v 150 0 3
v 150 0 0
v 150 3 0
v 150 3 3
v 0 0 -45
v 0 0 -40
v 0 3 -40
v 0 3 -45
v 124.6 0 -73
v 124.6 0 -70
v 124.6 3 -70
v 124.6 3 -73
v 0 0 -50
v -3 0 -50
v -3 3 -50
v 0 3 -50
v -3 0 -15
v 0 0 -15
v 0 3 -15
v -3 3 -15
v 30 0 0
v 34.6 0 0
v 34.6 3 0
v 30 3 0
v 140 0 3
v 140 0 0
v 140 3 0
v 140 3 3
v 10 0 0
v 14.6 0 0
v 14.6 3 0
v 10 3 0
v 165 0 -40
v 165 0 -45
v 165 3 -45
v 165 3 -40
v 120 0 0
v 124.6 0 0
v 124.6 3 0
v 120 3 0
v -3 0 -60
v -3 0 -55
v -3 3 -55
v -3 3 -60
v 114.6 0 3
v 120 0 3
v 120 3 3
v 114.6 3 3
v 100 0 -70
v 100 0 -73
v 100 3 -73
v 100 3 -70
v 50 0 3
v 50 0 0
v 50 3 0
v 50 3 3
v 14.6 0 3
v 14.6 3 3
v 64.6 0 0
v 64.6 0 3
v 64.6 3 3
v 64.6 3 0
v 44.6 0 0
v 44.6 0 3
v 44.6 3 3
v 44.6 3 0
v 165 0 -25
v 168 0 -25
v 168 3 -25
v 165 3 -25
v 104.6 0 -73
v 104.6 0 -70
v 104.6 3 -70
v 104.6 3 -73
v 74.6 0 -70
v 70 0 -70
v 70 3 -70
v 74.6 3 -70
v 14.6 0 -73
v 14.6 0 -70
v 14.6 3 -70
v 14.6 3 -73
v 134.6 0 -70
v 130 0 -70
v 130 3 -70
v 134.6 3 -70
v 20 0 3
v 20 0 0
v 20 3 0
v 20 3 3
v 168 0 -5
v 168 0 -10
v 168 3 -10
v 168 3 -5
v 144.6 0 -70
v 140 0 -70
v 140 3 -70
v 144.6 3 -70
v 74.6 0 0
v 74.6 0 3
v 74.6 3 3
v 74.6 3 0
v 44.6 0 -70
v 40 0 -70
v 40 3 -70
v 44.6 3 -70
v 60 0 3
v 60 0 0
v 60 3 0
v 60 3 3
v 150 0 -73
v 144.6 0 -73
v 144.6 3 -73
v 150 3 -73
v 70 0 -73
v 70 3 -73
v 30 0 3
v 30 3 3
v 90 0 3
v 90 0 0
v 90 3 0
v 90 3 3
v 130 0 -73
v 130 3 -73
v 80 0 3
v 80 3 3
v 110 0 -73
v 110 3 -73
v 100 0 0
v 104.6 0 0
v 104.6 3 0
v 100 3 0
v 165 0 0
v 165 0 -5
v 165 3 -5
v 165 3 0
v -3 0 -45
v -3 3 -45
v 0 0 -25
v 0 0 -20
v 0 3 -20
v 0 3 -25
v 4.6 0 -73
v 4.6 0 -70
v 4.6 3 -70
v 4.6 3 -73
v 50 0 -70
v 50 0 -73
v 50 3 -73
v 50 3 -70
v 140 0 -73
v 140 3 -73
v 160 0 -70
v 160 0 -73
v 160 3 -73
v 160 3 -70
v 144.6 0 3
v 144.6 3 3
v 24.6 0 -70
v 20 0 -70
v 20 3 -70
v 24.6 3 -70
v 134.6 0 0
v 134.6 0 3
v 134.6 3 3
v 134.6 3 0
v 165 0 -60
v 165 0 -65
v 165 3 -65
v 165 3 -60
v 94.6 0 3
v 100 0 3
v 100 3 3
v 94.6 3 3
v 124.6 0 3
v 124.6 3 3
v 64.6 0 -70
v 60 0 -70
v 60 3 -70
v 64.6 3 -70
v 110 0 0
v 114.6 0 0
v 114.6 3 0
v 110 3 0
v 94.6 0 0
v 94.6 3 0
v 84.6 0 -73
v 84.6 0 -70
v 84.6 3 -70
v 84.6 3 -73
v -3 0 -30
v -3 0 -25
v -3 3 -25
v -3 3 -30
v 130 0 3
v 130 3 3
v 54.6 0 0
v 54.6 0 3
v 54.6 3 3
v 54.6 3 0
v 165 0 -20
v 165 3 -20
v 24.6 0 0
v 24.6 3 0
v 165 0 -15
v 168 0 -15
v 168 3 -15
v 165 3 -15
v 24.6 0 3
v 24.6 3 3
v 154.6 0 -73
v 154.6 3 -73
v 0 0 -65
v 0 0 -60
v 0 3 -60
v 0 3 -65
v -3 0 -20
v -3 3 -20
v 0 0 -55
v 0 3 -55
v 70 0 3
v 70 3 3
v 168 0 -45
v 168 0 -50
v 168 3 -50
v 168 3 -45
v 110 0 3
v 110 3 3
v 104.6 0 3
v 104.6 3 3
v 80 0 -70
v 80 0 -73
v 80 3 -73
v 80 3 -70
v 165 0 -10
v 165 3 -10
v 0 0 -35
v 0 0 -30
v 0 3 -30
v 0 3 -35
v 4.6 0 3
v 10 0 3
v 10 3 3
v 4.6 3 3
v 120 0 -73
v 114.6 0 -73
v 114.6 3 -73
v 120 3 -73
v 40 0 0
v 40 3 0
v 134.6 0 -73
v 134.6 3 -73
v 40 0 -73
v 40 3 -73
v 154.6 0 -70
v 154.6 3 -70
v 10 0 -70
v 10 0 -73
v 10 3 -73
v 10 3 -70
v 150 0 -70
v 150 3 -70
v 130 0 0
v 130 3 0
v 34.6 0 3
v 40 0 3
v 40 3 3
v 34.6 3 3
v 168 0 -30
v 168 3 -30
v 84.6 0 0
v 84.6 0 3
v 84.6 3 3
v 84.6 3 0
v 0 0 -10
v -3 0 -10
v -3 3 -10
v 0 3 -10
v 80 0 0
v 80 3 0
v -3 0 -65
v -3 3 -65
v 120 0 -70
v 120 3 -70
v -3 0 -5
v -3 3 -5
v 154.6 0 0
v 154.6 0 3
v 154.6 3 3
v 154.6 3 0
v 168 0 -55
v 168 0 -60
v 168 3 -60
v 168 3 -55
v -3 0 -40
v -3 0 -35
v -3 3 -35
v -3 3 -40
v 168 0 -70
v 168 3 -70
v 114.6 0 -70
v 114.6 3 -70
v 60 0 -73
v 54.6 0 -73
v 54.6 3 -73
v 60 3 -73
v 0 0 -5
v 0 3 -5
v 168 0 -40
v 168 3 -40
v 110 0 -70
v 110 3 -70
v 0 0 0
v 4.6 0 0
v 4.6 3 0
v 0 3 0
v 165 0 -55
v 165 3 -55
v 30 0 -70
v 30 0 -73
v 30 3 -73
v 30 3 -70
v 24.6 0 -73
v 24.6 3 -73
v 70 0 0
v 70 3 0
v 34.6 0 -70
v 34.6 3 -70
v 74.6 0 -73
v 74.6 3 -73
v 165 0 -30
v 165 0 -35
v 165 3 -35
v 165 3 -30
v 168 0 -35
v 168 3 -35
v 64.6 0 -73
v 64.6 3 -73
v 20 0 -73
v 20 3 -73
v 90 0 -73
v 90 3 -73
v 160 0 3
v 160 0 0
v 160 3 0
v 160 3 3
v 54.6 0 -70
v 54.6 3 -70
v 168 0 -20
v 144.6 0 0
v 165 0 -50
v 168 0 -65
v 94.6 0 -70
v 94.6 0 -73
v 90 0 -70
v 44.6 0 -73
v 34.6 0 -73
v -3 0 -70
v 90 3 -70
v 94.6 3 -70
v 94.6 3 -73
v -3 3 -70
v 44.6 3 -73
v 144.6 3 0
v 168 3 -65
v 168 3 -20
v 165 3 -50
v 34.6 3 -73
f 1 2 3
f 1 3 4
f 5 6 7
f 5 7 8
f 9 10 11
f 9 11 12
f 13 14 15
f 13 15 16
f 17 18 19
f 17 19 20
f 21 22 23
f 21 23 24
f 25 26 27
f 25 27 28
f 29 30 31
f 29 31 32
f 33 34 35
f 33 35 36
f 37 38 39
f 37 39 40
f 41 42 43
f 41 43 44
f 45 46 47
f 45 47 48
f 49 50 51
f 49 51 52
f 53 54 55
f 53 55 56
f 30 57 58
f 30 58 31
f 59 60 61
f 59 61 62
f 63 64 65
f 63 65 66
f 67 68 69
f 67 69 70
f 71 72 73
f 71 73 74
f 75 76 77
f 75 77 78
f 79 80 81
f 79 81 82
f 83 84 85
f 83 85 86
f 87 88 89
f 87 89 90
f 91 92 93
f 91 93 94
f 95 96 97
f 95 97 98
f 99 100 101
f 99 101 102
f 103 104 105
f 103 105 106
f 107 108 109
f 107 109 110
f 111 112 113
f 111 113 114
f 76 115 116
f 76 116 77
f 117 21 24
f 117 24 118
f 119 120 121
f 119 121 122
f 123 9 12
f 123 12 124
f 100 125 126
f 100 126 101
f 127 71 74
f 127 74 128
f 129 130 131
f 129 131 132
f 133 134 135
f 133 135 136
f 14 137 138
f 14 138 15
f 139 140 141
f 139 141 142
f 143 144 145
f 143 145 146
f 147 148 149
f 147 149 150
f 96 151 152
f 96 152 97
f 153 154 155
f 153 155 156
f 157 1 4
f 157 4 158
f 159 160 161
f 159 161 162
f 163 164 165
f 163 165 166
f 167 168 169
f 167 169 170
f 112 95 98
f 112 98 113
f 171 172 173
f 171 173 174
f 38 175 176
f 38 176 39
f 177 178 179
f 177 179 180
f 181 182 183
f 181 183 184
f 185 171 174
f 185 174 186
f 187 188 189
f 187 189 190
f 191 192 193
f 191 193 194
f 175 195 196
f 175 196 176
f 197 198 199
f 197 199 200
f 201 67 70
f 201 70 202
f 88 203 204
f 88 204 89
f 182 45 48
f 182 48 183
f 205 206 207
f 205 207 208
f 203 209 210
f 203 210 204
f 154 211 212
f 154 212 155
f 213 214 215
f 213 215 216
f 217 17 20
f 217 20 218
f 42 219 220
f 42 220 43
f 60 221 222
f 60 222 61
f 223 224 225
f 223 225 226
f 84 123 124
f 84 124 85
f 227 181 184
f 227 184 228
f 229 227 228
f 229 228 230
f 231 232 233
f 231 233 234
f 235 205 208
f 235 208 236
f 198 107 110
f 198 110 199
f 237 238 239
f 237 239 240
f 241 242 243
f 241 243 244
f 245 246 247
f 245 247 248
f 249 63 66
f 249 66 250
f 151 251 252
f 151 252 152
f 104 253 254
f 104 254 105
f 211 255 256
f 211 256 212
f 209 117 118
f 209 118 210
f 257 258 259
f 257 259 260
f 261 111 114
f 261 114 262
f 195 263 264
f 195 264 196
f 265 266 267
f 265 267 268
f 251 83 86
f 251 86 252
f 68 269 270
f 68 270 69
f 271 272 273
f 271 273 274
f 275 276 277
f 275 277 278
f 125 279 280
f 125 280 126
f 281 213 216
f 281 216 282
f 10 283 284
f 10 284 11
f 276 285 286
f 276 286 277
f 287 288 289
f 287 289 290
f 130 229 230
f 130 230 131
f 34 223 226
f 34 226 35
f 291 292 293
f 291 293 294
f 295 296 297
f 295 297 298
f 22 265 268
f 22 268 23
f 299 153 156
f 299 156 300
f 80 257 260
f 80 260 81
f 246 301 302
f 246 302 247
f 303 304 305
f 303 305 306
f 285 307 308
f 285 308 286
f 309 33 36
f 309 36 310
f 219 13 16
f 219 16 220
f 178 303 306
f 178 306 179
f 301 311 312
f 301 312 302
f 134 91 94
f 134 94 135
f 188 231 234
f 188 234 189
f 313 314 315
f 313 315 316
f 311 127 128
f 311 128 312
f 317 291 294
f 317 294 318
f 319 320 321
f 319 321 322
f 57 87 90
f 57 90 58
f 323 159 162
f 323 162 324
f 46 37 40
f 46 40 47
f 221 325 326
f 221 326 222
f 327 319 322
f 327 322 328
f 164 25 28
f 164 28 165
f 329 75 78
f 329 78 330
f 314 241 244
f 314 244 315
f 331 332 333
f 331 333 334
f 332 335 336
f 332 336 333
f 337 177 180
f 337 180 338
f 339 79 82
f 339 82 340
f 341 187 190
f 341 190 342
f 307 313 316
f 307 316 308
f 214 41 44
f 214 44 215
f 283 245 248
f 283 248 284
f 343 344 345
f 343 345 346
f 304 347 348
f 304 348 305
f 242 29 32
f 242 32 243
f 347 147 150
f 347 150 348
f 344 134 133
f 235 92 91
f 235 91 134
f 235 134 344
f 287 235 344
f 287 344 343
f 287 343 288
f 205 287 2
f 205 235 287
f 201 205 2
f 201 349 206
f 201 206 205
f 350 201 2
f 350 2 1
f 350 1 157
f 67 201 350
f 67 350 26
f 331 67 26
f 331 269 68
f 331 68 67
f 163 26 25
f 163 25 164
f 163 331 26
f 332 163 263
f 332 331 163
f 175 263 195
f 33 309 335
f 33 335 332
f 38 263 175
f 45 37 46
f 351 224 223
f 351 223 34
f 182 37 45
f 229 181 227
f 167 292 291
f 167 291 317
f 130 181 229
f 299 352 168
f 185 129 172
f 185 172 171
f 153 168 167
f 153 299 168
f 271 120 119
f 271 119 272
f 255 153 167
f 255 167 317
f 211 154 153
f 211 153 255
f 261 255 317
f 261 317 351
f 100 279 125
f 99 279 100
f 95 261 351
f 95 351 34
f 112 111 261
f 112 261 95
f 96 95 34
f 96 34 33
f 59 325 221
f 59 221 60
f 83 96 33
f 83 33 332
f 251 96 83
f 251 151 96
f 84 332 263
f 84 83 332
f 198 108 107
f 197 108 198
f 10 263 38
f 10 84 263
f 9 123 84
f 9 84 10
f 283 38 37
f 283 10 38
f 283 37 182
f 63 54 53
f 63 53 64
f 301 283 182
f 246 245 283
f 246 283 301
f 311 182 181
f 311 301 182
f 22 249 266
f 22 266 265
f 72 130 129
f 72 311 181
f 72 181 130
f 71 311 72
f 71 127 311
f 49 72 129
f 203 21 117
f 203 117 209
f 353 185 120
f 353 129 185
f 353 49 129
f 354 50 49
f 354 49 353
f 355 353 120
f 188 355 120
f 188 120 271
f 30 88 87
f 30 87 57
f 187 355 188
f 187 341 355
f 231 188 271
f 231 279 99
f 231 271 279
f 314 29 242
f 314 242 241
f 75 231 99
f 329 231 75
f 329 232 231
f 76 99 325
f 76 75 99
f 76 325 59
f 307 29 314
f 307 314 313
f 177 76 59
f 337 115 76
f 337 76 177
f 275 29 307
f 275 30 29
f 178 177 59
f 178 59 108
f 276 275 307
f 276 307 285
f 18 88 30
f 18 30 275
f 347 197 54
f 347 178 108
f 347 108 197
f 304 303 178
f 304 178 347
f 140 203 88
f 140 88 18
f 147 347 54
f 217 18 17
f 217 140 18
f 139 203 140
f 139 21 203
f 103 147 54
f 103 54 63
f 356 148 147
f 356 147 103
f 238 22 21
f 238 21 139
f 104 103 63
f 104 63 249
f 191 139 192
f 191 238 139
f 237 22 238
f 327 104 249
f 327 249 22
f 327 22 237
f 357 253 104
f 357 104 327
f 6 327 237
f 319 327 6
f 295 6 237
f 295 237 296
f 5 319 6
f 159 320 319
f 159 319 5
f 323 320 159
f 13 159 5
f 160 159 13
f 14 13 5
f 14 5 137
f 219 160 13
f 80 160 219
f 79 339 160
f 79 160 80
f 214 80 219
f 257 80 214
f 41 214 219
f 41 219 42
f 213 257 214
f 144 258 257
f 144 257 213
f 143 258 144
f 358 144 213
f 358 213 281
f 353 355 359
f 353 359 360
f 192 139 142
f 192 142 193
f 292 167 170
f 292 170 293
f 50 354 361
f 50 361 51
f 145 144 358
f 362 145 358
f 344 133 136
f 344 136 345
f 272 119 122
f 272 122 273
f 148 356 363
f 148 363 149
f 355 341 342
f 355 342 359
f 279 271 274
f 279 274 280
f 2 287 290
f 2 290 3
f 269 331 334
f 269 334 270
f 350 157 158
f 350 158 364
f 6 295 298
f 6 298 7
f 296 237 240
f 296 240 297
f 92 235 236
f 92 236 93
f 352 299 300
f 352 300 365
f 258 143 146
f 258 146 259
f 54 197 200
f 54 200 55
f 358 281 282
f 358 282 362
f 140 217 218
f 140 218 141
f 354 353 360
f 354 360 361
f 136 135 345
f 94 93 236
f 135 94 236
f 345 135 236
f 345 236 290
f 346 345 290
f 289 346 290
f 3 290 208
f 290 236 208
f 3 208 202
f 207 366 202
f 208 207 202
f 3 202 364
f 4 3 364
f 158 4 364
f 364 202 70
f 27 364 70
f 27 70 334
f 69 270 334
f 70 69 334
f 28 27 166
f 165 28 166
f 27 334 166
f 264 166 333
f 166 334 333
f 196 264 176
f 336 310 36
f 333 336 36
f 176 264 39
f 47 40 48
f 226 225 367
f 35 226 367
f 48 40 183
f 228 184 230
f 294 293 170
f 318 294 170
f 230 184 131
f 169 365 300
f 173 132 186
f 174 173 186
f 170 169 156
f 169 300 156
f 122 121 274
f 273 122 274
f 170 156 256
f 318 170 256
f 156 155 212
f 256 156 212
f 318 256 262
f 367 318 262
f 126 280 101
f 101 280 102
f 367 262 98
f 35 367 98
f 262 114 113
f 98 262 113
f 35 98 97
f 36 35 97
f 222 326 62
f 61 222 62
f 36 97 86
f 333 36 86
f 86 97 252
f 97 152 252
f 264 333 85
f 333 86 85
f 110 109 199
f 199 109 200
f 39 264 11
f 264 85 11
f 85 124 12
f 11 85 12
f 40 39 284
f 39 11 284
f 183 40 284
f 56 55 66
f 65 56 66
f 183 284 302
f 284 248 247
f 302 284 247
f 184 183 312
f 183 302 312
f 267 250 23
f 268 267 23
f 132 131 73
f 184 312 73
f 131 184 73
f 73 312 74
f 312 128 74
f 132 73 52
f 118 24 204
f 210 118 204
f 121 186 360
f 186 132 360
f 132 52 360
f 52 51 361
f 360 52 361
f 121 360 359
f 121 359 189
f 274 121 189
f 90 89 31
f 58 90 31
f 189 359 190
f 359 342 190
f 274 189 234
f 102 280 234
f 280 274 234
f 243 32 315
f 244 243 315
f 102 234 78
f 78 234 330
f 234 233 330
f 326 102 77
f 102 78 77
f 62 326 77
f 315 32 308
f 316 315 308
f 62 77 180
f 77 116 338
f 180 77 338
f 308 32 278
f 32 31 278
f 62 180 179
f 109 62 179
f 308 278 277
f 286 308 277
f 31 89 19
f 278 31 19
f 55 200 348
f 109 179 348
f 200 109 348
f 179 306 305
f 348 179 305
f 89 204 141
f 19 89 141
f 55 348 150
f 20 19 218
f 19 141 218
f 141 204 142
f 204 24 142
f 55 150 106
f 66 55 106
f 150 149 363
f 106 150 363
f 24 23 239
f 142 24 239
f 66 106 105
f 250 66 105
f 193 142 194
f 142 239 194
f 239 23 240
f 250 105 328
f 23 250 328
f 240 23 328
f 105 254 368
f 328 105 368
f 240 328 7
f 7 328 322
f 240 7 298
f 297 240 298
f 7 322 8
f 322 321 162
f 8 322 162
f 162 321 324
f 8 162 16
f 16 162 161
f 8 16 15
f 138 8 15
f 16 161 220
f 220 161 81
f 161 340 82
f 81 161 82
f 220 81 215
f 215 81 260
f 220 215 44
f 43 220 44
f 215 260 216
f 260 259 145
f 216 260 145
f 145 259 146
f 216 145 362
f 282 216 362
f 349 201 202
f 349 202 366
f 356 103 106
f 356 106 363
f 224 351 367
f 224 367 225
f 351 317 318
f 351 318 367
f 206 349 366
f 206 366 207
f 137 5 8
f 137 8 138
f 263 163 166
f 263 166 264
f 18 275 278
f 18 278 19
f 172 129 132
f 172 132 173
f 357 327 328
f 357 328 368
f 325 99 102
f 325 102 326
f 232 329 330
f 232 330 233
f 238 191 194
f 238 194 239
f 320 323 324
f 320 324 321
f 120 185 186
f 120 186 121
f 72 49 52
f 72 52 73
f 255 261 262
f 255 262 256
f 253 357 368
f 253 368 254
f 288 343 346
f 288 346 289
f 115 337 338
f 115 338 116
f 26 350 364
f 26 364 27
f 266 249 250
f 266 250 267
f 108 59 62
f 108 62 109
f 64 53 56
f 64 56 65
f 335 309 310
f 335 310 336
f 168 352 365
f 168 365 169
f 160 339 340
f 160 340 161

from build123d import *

# Parameters (mm, degrees)
EXTRUDE_1_DEPTH = 3


with BuildPart() as part:
    # Эскиз1 → Бобышка-Вытянуть1 (new body)
    with BuildSketch(Plane(origin=(0, 0, 0), x_dir=(1, 0, 0), z_dir=(0, 1, 0))):
        Polygon((4.6, 70), (4.6, 73), (10, 73), (10, 70), (14.6, 70), (14.6, 73), (20, 73), (20, 70), (24.6, 70), (24.6, 73), (30, 73), (30, 70), (34.6, 70), (34.6, 73), (40, 73), (40, 70), (44.6, 70), (44.6, 73), (50, 73), (50, 70), (54.6, 70), (54.6, 73), (60, 73), (60, 70), (64.6, 70), (64.6, 73), (70, 73), (70, 70), (74.6, 70), (74.6, 73), (80, 73), (80, 70), (84.6, 70), (84.6, 73), (90, 73), (90, 70), (94.6, 70), (94.6, 73), (100, 73), (100, 70), (104.6, 70), (104.6, 73), (110, 73), (110, 70), (114.6, 70), (114.6, 73), (120, 73), (120, 70), (124.6, 70), (124.6, 73), (130, 73), (130, 70), (134.6, 70), (134.6, 73), (140, 73), (140, 70), (144.6, 70), (144.6, 73), (150, 73), (150, 70), (154.6, 70), (154.6, 73), (160, 73), (160, 70), (168, 70), (168, 65), (165, 65), (165, 60), (168, 60), (168, 55), (165, 55), (165, 50), (168, 50), (168, 45), (165, 45), (165, 40), (168, 40), (168, 35), (165, 35), (165, 30), (168, 30), (168, 25), (165, 25), (165, 20), (168, 20), (168, 15), (165, 15), (165, 10), (168, 10), (168, 5), (165, 5), (165, 0), (160, 0), (160, -3), (154.6, -3), (154.6, 0), (150, 0), (150, -3), (144.6, -3), (144.6, 0), (140, 0), (140, -3), (134.6, -3), (134.6, 0), (130, 0), (130, -3), (124.6, -3), (124.6, 0), (120, 0), (120, -3), (114.6, -3), (114.6, 0), (110, 0), (110, -3), (104.6, -3), (104.6, 0), (100, 0), (100, -3), (94.6, -3), (94.6, 0), (90, 0), (90, -3), (84.6, -3), (84.6, 0), (80, 0), (80, -3), (74.6, -3), (74.6, 0), (70, 0), (70, -3), (64.6, -3), (64.6, 0), (60, 0), (60, -3), (54.6, -3), (54.6, 0), (50, 0), (50, -3), (44.6, -3), (44.6, 0), (40, 0), (40, -3), (34.6, -3), (34.6, 0), (30, 0), (30, -3), (24.6, -3), (24.6, 0), (20, 0), (20, -3), (14.6, -3), (14.6, 0), (10, 0), (10, -3), (4.6, -3), (4.6, 0), (0, 0), (0, 5), (-3, 5), (-3, 10), (0, 10), (0, 15), (-3, 15), (-3, 20), (0, 20), (0, 25), (-3, 25), (-3, 30), (0, 30), (0, 35), (-3, 35), (-3, 40), (0, 40), (0, 45), (-3, 45), (-3, 50), (0, 50), (0, 55), (-3, 55), (-3, 60), (0, 60), (0, 65), (-3, 65), (-3, 70), (0, 70), align=None)
    extrude(amount=EXTRUDE_1_DEPTH)


solid = part.part
